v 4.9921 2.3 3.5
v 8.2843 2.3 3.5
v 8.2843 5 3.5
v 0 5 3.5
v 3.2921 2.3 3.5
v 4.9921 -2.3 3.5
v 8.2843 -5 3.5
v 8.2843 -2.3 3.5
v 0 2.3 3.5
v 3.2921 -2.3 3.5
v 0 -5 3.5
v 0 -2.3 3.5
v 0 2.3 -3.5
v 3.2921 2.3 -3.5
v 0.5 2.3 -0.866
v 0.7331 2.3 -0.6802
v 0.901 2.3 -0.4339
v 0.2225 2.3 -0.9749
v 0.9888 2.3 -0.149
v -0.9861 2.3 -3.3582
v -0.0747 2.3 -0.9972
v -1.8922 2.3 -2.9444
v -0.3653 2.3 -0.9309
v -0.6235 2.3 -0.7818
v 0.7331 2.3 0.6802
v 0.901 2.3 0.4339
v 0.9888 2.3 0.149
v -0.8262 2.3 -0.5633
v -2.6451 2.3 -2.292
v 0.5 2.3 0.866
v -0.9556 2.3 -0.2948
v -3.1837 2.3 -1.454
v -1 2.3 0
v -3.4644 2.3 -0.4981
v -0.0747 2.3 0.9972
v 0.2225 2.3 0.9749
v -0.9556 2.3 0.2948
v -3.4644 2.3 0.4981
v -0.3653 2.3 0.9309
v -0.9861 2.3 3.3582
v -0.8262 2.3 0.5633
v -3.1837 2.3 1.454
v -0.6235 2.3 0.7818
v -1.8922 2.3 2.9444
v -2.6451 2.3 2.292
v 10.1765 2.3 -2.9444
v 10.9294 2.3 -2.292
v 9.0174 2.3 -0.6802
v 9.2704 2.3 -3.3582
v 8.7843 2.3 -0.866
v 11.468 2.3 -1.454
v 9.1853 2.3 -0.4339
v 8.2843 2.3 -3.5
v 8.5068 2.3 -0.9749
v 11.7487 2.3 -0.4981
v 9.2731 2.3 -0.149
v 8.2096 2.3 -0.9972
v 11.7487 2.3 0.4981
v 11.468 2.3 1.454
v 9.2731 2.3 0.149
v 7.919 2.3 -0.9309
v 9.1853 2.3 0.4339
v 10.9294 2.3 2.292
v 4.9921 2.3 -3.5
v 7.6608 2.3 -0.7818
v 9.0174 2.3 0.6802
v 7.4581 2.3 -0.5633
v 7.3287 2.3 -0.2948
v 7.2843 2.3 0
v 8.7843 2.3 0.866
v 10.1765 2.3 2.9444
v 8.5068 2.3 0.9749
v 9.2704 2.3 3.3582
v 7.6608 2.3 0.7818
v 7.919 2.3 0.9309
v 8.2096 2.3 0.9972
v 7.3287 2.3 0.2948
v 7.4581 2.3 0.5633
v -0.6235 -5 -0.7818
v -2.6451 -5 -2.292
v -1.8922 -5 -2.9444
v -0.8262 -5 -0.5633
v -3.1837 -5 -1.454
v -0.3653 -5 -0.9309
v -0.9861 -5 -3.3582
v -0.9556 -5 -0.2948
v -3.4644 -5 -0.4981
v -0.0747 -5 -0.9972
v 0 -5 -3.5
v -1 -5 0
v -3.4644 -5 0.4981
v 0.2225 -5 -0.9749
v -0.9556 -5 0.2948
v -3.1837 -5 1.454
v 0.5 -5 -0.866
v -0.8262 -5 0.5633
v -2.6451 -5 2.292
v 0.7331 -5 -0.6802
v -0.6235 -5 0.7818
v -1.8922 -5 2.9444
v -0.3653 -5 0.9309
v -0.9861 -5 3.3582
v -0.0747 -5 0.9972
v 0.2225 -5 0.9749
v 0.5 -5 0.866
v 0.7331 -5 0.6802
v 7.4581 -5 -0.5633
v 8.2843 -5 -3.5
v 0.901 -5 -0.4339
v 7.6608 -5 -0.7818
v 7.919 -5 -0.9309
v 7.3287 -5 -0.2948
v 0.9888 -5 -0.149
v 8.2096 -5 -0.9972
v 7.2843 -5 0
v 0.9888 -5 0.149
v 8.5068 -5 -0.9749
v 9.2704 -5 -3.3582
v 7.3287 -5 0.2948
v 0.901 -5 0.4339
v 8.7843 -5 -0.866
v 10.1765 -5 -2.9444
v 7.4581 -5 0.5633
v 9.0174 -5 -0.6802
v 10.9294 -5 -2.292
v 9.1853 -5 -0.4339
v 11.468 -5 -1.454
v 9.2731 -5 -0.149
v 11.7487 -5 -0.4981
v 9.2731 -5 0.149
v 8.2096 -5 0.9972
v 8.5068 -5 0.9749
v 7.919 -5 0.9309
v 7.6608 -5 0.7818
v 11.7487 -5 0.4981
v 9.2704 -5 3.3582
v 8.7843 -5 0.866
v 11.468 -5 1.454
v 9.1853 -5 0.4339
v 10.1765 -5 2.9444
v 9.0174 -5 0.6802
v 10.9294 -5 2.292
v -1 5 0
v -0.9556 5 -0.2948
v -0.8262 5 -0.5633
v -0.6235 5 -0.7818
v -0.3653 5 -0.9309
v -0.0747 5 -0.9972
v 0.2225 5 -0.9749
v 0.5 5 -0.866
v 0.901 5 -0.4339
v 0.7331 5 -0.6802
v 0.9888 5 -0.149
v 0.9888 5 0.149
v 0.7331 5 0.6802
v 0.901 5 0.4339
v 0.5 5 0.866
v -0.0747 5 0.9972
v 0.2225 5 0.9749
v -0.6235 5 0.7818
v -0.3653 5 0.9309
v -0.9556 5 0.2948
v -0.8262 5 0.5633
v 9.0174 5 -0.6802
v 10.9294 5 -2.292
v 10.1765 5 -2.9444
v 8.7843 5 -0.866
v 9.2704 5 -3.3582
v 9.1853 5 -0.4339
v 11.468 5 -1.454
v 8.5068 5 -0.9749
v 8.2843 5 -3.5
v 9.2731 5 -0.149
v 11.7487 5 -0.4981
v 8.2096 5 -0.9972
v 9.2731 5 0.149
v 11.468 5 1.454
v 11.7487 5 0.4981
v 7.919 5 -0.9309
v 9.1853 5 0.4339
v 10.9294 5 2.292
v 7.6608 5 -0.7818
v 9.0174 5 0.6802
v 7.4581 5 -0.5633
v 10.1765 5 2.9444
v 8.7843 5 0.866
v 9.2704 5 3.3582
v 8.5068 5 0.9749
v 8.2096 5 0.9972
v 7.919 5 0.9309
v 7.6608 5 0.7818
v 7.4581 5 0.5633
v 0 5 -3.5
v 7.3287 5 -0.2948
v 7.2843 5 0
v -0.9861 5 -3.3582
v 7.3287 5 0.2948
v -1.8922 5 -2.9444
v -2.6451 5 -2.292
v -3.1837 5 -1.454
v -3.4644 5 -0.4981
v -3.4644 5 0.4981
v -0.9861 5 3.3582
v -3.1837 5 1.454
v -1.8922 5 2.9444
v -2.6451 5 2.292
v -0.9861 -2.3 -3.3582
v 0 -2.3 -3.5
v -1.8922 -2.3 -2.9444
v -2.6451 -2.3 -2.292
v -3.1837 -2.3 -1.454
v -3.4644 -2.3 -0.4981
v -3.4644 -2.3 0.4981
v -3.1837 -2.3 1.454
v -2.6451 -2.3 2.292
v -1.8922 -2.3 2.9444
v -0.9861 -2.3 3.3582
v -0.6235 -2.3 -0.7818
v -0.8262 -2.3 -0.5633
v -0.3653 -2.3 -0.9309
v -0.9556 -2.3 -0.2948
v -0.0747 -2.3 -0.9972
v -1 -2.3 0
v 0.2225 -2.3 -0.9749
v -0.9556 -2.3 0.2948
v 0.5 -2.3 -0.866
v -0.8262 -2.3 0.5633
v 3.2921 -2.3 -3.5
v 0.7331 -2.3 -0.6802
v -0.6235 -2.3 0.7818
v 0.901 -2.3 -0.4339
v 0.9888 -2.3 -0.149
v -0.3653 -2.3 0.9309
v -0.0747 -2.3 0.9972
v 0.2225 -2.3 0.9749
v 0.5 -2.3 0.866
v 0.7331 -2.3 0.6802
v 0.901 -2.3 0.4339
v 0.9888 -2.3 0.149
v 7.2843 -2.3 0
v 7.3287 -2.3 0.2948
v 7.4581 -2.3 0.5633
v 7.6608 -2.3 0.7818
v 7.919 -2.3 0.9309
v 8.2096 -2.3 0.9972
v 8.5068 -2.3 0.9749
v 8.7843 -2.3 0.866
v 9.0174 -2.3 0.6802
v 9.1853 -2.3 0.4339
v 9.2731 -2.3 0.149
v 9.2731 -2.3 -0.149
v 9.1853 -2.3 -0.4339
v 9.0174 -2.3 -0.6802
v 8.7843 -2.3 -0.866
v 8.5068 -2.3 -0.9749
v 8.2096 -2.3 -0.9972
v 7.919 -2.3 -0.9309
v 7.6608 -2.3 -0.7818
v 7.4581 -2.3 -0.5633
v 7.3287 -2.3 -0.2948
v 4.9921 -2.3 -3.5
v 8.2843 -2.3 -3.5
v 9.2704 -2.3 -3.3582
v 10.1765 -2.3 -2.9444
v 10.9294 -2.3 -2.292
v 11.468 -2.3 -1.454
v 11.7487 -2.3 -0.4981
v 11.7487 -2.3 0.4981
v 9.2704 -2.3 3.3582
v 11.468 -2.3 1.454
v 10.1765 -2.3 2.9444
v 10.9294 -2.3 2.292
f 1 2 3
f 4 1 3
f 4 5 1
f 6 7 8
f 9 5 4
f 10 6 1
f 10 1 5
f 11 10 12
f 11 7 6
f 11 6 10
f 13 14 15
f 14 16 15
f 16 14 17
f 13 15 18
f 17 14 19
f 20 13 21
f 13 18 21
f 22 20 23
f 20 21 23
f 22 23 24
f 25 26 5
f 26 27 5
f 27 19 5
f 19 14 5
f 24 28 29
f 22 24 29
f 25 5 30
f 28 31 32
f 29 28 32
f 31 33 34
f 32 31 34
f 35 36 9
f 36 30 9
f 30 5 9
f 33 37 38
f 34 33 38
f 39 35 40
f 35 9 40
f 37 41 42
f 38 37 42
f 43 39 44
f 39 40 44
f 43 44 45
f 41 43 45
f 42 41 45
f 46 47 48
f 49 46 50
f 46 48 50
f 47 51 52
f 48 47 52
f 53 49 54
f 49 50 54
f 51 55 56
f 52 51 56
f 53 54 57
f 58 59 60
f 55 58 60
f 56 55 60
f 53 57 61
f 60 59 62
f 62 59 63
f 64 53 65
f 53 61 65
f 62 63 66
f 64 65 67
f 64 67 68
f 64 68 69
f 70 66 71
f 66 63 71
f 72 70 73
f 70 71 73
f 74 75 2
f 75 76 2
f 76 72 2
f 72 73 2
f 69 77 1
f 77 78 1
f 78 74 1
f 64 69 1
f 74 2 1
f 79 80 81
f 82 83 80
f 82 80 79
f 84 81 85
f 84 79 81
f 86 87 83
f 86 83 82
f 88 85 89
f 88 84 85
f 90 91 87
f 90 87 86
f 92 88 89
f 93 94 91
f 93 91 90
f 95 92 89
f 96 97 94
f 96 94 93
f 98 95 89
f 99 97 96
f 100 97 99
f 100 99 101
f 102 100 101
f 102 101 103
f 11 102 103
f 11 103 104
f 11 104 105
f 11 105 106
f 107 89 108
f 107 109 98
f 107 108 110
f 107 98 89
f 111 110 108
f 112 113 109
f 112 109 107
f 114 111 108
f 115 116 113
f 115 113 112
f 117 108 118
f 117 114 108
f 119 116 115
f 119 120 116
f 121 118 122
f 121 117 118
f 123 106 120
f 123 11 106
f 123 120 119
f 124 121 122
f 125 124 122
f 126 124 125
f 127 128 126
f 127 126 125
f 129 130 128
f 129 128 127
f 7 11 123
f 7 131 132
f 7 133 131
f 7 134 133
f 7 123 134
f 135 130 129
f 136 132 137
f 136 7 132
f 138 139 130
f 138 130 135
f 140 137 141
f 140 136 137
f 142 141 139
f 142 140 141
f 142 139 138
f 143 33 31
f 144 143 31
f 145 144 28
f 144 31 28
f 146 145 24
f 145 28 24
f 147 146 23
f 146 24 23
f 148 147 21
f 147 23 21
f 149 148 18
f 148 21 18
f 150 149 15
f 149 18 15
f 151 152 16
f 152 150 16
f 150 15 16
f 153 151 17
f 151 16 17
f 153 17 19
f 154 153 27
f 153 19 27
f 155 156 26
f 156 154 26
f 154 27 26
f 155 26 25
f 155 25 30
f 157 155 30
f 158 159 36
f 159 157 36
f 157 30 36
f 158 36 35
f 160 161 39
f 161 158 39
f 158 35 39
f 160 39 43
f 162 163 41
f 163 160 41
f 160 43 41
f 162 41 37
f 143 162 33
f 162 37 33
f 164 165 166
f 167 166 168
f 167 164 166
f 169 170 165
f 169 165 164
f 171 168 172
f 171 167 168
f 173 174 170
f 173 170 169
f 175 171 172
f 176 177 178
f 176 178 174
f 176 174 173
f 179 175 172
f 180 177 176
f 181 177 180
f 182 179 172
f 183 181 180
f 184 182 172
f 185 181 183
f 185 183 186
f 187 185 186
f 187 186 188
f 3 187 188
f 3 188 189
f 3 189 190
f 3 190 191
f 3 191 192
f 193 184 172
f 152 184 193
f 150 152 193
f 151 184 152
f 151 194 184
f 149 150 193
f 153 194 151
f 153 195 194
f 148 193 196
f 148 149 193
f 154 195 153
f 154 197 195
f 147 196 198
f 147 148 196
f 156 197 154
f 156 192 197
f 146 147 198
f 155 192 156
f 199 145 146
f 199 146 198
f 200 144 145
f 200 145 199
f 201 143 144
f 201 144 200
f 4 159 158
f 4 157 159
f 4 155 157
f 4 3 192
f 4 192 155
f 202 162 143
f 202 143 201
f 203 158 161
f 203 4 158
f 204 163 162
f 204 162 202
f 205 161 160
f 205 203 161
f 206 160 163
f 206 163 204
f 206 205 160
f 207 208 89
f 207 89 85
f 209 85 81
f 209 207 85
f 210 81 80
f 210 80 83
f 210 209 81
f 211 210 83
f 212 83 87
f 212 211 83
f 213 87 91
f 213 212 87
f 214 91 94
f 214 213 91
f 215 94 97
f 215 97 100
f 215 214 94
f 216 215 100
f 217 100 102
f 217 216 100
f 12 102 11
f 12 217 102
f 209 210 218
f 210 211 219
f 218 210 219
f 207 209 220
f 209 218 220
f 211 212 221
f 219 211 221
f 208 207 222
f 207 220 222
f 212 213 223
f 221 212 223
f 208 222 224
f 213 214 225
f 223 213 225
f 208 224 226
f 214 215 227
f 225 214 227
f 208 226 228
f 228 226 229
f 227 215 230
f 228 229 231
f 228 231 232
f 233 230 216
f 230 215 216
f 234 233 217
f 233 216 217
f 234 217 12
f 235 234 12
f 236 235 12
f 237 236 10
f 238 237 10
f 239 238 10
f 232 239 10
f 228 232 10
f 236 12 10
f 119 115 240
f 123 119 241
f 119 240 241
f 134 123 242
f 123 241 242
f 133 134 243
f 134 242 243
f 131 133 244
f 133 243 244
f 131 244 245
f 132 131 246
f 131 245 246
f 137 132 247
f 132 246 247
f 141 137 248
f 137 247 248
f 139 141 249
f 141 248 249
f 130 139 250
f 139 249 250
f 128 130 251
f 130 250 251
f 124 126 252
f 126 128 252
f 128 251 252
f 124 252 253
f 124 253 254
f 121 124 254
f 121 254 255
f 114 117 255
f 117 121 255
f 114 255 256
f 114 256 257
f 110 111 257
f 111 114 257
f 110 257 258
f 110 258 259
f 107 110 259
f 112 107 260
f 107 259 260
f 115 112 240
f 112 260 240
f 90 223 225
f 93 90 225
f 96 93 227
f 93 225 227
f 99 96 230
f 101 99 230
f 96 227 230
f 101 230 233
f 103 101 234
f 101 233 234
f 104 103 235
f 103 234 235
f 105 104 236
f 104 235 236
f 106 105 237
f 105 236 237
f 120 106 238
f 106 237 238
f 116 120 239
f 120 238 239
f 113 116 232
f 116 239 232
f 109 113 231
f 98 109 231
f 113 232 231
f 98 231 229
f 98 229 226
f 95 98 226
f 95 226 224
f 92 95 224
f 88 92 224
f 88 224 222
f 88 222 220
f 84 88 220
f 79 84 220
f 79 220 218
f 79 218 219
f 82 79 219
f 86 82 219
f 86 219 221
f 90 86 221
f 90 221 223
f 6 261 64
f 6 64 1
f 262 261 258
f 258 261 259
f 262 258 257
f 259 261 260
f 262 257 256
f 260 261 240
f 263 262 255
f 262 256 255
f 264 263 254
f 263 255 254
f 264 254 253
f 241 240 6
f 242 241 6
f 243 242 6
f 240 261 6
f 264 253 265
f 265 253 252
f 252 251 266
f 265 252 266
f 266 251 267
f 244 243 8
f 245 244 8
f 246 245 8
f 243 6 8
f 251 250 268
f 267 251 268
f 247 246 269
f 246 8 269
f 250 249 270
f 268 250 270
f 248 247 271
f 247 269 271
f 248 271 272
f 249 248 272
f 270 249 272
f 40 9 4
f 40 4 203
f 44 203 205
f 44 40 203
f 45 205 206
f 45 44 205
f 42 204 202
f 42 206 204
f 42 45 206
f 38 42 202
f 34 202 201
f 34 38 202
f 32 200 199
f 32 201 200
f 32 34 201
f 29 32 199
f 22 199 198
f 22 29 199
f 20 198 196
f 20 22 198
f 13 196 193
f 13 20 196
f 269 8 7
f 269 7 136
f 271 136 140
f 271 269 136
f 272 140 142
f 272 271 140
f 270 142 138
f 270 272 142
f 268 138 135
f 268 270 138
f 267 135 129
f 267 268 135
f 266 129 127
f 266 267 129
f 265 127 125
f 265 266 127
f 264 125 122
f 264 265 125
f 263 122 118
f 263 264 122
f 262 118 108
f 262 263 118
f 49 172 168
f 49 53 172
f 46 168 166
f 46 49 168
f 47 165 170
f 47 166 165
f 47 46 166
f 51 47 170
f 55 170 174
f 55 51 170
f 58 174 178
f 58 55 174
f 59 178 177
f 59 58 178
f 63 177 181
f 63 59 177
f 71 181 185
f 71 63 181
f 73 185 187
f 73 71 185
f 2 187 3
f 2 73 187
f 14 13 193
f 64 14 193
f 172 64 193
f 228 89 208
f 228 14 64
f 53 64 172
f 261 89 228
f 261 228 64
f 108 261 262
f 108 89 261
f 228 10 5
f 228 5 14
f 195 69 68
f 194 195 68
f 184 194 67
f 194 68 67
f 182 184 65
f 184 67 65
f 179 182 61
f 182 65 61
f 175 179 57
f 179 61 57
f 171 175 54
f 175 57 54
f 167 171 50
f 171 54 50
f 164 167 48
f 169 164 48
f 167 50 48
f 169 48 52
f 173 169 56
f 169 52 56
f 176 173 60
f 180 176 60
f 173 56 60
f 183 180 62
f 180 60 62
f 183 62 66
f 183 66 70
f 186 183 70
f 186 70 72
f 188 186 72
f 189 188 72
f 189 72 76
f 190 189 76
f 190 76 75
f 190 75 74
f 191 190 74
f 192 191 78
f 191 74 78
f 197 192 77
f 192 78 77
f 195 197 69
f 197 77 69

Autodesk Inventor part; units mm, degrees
ref_plane "YZ Plane" through (0, 0, 0) normal (1, 0, 0) x (0, 1, 0)
ref_plane "XZ Plane" through (0, 0, 0) normal (0, 1, 0) x (-1, 0, 0)
ref_plane "XY Plane" through (0, 0, 0) normal (0, 0, 1) x (1, 0, 0)
sketch "スケッチ1" plane through (0, 0, 0) normal (0, 1, 0) x (-1, 0, 0)
  circle A0 centre (0, 0) radius 1
  circle A1 centre (0, 0) radius 3.5
  circle A2 centre (-8.2843, 0) radius 3.5
  line L0 (0, -3.5) -> (-8.2843, -3.5)
  line L1 (-8.2843, -3.5) -> (-8.2843, 3.5) construction
  line L2 (-8.2843, 3.5) -> (0, 3.5)
  line L3 (0, 3.5) -> (0, -3.5) construction
  circle A3 centre (-8.2843, 0) radius 1
  line L4 (-3.2921, -3.5) -> (-4.9921, -3.5)
  line L5 (-4.9921, -3.5) -> (-4.9921, 3.5)
  line L6 (-4.9921, 3.5) -> (-3.2921, 3.5)
  line L7 (-3.2921, 3.5) -> (-3.2921, -3.5)
  circle A4 centre (-4.1421, 10) radius 10
  line L8 (0, 0) -> (-8.2843, 0)
  line L9 (-4.1421, 10) -> (0, 0)
  line L10 (-4.1421, 10) -> (-8.2843, 0)
  line L11 (-4.1421, -3.5) -> (-4.1421, 3.5) construction
  point P0 (-8.2843, -3.5)
  point P1 (-3.2921, 3.5)
  point P2 (-4.1421, 0)
  dimension "d1" = 7
  dimension "d0" = 2
  dimension "d13" = 20
  dimension "d14" = 45
  dimension "d31" = 1.7
extrude "押し出し3" add sketch "スケッチ1" along normal blind 5 contours A0 A4 A1 L7 L8 | A0 L9 A1 A4 | L8 L7 A4 A0 | A0 A4 L7 A1 L9 | L8 A1 A4 L7 | L7 A1 L8 | L9 L2 A1 | A1 L7 L2 L9 | A4 A1 L7 | L7 L0 L5 A2 L8 A1 | A1 L0 L7 | L8 A4 A1 | A1 A4 A2 L5 L2 L7 | A4 A3 L8 L5 A2 | A2 L10 A3 A4 | L8 A2 A4 | L2 L10 A2 | A2 L5 L0 | A4 L5 A2 | A2 L8 L5 A4 | A2 L5 L8 | L5 A2 L10 L2 | A2 L5 A4 A3 L10 | A3 A4 L5 L8
extrude "押し出し4" cut sketch "スケッチ1" along normal blind 2.3 contours A0 A4 A1 L7 L8 | A0 L9 A1 A4 | L8 L7 A4 A0 | A0 A4 L7 A1 L9 | L9 L2 A1 | A1 L7 L2 L9 | A1 L0 L7 | A4 A3 L8 L5 A2 | A2 L10 A3 A4 | L2 L10 A2 | A2 L5 L0 | L5 A2 L10 L2 | A2 L5 A4 A3 L10 | A3 A4 L5 L8
mirror "ミラー2" about plane through (4.1421, 0, 0) normal (0, -1, 0)
properties part number "chain_1"
